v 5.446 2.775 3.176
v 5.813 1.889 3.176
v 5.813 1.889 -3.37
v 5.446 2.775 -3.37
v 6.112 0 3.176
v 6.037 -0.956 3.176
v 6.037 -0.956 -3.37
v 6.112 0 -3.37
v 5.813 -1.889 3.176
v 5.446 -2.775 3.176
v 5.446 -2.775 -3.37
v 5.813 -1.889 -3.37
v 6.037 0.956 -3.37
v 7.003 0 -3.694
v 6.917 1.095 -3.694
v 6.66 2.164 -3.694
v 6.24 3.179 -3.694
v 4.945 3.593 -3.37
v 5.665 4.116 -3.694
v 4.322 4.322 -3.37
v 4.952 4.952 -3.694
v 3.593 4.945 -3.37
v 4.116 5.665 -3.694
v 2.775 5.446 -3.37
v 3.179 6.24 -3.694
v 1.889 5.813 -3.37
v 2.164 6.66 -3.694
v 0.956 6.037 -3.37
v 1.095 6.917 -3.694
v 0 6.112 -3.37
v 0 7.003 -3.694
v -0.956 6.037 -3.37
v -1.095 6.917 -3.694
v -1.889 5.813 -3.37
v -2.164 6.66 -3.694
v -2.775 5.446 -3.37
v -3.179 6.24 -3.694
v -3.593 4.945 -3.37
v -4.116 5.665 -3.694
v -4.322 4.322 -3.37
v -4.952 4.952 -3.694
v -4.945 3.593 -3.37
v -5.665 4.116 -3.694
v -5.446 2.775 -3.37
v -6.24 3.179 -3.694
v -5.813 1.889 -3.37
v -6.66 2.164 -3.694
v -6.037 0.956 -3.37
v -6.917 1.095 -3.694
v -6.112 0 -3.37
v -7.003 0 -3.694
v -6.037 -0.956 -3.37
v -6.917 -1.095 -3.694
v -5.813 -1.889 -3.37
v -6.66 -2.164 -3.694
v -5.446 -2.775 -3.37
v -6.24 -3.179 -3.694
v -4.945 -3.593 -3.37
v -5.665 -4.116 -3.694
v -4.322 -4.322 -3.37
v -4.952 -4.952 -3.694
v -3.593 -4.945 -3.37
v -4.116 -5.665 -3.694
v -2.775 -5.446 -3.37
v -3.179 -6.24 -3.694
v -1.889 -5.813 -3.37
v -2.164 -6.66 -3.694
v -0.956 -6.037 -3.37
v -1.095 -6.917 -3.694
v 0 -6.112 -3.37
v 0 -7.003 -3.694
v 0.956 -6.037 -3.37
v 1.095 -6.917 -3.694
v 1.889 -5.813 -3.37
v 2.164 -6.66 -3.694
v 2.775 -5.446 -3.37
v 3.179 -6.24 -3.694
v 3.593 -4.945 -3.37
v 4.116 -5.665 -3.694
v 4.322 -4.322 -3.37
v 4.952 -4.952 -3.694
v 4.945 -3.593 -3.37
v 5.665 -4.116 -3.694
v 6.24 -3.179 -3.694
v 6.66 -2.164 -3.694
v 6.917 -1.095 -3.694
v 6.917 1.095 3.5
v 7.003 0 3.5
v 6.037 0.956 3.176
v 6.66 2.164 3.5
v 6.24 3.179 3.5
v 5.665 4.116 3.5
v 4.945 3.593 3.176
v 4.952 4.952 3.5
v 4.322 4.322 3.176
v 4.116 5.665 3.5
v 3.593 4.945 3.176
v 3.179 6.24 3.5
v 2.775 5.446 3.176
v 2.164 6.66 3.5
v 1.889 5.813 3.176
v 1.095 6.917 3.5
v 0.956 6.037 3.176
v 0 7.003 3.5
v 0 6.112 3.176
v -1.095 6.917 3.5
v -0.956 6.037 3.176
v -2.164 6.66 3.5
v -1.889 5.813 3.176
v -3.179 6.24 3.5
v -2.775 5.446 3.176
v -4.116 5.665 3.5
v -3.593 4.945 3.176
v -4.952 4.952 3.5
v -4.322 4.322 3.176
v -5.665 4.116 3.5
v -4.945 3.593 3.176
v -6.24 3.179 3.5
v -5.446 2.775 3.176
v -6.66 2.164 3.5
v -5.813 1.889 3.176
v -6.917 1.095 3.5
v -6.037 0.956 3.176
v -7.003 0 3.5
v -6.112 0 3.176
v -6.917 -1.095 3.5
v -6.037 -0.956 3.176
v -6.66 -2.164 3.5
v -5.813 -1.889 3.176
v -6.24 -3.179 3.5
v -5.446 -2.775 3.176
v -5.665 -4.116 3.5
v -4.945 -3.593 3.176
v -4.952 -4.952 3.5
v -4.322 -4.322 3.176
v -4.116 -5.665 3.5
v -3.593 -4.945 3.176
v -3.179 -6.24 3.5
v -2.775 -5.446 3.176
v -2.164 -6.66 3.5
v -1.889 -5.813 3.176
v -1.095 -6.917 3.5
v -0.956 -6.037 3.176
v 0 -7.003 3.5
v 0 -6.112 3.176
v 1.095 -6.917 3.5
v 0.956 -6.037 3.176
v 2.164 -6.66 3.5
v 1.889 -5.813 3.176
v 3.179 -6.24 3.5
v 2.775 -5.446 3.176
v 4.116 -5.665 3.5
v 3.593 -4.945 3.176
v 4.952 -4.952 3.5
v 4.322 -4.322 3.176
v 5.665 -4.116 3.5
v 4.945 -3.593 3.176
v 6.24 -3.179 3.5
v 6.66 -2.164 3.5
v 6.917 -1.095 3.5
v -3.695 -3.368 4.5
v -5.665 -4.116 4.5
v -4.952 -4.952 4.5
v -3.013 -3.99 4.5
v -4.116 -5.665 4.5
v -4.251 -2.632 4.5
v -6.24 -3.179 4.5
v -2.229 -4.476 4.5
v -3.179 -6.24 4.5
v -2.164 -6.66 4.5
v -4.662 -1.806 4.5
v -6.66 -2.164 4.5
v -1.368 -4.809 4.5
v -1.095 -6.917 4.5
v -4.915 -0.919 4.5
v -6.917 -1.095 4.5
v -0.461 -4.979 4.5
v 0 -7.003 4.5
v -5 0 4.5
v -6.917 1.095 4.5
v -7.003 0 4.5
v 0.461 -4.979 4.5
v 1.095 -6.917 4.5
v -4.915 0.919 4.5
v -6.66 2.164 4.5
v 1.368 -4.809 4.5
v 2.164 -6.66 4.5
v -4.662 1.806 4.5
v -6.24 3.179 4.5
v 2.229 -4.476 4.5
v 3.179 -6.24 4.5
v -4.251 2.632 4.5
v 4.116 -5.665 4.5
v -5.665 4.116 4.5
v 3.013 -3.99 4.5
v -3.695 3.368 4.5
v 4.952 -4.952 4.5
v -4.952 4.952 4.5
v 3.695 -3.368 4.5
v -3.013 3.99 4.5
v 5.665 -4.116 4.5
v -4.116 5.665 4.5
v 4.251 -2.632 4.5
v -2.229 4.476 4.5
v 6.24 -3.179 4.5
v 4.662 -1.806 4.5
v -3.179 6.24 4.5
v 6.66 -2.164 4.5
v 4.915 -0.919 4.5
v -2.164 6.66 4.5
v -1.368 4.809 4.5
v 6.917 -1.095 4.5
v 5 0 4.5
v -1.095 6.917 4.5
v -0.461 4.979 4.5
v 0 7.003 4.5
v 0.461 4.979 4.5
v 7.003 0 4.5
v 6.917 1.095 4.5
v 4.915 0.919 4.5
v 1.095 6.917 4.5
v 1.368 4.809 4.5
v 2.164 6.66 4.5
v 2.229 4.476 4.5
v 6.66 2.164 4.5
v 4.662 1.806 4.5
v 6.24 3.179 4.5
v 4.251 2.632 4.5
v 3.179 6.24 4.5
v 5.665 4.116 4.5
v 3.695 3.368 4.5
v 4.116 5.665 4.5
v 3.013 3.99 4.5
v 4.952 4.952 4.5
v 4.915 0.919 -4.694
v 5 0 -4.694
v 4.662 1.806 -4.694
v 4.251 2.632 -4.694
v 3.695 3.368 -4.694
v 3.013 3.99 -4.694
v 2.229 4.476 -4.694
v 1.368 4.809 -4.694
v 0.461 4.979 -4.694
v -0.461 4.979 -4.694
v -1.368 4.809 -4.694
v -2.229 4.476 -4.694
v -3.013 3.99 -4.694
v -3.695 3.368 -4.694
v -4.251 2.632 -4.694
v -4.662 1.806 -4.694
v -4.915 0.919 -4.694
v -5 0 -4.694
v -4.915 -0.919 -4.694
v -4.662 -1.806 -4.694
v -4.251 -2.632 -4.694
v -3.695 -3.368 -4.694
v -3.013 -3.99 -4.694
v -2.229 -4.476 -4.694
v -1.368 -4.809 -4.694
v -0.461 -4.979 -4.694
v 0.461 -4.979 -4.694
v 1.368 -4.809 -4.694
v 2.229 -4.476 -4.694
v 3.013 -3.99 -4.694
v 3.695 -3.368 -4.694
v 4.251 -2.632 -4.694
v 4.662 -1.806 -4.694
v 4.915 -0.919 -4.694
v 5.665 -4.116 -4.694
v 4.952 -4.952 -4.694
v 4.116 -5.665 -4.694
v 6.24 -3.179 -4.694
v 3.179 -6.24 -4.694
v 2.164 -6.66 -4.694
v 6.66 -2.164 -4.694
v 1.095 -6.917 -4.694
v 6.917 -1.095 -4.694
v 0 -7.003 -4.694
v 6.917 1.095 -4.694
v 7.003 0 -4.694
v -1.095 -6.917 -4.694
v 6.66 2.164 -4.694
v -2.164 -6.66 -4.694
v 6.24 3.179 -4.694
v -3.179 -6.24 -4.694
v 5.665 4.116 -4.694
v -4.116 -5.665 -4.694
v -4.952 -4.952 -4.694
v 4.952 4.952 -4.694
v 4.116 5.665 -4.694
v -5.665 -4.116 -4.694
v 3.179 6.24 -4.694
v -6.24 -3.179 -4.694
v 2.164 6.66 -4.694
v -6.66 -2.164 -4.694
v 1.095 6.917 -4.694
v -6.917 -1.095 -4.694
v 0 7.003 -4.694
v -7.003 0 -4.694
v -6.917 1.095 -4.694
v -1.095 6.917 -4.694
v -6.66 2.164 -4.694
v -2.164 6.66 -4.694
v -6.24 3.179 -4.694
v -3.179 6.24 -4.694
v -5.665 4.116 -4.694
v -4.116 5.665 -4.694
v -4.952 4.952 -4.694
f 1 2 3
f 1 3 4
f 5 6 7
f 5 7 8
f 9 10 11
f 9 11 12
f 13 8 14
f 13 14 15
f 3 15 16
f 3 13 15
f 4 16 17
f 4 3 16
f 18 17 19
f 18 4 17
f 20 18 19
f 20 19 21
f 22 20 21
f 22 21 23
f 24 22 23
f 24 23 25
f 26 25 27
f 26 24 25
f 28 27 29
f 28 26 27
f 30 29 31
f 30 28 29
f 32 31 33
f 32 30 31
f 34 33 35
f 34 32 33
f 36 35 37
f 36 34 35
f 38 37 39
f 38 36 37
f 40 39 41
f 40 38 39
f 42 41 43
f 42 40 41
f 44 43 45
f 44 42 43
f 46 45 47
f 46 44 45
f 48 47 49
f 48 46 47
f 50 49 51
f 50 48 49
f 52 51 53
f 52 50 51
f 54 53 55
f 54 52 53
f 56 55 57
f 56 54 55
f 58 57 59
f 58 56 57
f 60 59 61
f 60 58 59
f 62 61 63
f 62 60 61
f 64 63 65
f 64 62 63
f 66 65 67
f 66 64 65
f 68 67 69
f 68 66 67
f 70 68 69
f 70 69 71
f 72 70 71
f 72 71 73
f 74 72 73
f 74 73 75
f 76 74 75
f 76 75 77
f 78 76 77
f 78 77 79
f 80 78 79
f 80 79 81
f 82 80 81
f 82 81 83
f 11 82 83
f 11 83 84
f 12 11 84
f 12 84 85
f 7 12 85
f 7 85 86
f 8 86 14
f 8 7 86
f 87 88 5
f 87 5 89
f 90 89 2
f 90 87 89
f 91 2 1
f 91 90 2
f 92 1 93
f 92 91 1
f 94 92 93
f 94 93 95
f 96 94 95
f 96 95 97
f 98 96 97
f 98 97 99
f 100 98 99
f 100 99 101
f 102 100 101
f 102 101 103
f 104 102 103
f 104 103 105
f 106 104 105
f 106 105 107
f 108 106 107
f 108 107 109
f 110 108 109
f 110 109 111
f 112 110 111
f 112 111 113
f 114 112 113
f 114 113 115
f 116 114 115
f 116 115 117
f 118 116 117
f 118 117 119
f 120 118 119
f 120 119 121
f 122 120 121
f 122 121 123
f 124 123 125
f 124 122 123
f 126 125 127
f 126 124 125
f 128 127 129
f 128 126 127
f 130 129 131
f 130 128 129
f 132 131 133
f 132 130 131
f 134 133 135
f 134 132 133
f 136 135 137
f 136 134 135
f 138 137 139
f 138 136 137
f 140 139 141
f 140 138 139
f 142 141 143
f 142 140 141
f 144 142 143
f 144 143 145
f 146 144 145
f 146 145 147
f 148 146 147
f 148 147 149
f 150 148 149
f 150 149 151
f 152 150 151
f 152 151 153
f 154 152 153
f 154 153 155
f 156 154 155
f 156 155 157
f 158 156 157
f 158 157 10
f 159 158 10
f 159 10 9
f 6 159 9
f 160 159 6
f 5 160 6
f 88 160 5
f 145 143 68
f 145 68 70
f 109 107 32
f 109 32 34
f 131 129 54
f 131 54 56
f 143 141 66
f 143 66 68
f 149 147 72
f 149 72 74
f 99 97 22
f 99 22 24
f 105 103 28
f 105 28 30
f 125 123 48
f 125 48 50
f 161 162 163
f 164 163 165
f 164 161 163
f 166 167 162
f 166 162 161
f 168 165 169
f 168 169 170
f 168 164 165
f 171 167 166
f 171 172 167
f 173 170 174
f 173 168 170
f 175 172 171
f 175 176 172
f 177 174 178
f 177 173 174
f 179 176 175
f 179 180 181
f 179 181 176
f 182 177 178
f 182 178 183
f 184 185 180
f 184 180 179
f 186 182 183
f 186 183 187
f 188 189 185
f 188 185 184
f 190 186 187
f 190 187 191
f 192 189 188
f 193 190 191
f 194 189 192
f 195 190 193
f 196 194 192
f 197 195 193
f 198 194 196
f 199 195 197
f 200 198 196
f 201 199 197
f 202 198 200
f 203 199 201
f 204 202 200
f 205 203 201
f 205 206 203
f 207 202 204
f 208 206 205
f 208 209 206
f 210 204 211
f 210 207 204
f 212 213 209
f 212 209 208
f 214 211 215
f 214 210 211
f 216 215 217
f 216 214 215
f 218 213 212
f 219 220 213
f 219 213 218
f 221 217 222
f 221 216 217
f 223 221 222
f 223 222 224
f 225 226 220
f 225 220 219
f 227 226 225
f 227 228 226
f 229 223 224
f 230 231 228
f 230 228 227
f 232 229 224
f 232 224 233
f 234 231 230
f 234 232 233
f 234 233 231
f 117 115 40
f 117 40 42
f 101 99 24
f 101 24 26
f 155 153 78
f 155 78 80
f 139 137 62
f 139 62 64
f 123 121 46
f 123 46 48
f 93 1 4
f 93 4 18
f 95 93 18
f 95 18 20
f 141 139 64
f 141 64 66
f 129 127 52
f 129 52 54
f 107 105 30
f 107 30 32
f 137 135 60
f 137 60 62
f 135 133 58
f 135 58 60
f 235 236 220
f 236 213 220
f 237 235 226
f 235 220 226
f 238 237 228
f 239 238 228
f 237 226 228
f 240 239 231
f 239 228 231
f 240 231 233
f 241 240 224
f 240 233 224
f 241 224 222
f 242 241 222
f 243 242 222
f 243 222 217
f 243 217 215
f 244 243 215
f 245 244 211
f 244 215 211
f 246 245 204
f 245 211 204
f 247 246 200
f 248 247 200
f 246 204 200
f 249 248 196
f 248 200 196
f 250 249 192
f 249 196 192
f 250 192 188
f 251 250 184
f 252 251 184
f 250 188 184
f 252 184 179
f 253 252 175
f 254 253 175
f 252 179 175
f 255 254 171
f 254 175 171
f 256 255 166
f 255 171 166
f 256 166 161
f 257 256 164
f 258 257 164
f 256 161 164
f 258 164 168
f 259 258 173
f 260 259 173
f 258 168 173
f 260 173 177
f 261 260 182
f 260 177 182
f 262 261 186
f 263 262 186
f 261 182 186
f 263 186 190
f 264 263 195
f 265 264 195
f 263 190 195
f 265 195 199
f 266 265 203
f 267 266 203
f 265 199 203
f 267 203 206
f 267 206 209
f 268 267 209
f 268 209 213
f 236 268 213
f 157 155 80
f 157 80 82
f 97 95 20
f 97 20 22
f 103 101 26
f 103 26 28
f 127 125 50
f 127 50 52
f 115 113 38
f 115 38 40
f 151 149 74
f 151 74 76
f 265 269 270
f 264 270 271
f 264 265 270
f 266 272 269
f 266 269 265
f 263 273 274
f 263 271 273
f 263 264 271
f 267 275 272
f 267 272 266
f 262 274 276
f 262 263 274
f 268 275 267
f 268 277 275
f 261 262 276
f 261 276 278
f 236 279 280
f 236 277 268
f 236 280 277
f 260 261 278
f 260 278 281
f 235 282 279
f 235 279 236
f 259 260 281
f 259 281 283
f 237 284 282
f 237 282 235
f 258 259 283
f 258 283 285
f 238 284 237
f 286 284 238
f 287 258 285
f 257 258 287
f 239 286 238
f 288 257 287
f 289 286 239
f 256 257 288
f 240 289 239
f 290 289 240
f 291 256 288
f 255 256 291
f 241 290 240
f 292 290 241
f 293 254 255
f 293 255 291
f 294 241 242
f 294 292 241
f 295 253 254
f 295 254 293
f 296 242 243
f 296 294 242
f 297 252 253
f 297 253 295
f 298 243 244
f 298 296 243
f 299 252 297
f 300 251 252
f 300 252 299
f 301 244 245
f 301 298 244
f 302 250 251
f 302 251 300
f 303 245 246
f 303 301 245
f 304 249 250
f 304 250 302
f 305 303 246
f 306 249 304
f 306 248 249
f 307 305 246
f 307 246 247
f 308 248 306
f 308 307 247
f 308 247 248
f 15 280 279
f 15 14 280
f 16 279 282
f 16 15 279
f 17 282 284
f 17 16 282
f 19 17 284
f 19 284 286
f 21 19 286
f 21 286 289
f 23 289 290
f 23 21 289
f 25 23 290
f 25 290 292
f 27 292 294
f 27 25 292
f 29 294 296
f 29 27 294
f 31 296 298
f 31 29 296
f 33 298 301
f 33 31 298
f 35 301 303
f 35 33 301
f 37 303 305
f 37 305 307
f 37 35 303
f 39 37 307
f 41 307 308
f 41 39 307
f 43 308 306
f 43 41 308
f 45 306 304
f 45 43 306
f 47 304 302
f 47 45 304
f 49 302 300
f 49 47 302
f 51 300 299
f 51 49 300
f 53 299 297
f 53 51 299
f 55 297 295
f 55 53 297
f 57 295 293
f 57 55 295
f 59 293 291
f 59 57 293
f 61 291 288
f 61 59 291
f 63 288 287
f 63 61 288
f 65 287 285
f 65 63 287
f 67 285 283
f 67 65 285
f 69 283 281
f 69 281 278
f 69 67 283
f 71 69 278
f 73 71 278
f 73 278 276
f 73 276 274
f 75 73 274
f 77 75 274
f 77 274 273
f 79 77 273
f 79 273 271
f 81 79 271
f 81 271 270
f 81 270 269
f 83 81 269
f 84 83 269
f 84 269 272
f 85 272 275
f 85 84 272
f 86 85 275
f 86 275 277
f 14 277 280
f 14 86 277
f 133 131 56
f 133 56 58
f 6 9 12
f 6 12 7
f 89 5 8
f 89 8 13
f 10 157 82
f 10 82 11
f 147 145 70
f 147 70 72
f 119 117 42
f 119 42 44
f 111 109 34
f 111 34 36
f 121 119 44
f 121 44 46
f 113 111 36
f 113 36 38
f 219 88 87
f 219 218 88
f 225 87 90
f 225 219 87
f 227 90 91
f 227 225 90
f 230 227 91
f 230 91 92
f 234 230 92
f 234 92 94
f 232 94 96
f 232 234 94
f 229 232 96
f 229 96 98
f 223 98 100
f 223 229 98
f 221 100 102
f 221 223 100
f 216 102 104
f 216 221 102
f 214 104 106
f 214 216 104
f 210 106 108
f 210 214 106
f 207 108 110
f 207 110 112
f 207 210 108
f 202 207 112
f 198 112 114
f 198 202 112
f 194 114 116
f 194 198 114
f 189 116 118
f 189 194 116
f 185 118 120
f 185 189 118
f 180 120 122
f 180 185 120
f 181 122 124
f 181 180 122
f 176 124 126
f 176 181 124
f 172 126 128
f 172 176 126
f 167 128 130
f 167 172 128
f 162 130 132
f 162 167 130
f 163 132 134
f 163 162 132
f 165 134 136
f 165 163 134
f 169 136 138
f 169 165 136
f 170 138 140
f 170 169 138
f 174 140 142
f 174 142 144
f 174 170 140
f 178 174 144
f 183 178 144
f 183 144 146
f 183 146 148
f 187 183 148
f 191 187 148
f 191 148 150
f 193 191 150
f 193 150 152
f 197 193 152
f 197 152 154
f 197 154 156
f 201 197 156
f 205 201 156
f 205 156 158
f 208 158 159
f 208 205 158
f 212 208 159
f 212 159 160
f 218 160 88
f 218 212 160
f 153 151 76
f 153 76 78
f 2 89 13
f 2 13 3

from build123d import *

# Parameters (mm, degrees)
F3_DEPTH = 4.5
F4_COUNT = 20
F7_R     = 5
F8_DEPTH = 50


# Not quite as in the source:
# - a feature names something its author has since deleted; it is built from what else it names


with BuildPart() as f3:
    # F2 (on Top) → F3 (new body, symmetric)
    with BuildSketch(Plane.XY):
        with BuildLine():
            Line((0.8388325323, 5.2961801716), (0.9561583811, 6.0369464271))
            ThreePointArc((0.9561583811, 6.0369464271), (0.4795575063, 6.0933558579), (0, 6.1121977237))
            ThreePointArc((0, 6.1121977237), (-0.2034624056, 6.108810364), (-0.4066992948, 6.0986520393))
            ThreePointArc((-0.4066992948, 6.0986520393), (-0.682126936, 6.074015464), (-0.9561583811, 6.0369464271))
            Line((-0.9561583811, 6.0369464271), (-0.8388325323, 5.2961801716))
            Line((-0.8388325323, 5.2961801716), (0, 0))
            Line((0, 0), (0.8388325323, 5.2961801716))
        make_face()
    extrude(amount=F3_DEPTH, both=True)

    # F4: F3 ×20 about axis
    f4_axis = Axis((0, 0, 0), (0, 0, -1))


with BuildPart() as f3_1:
    add(f3.part)
    for i in range(1, F4_COUNT):
        add(f3.part.rotate(f4_axis, i * 360 / F4_COUNT))

    # F5 (on Front) → F6 (revolve)
    with BuildSketch(Plane.XZ):
        Polygon((7.002817496, 4.5), (0, 4.5), (0, 2.9028632371), (5.3621977237, 2.9028632371), (7.002817496, 3.5), align=None)
        Polygon((5.3621977237, -3.0971367629), (0, -3.0971367629), (0, -4.6942735258), (7.002817496, -4.6942735258), (7.002817496, -3.6942735258), align=None)
    revolve(axis=Axis((0, 0, 3.7014316186), (0, 0, 1)))

    # F7 (on Top) → F8 (cut, symmetric)
    with BuildSketch(Plane.XY):
        Circle(F7_R)
    extrude(amount=F8_DEPTH, both=True, mode=Mode.SUBTRACT)


solid = f3_1.part
